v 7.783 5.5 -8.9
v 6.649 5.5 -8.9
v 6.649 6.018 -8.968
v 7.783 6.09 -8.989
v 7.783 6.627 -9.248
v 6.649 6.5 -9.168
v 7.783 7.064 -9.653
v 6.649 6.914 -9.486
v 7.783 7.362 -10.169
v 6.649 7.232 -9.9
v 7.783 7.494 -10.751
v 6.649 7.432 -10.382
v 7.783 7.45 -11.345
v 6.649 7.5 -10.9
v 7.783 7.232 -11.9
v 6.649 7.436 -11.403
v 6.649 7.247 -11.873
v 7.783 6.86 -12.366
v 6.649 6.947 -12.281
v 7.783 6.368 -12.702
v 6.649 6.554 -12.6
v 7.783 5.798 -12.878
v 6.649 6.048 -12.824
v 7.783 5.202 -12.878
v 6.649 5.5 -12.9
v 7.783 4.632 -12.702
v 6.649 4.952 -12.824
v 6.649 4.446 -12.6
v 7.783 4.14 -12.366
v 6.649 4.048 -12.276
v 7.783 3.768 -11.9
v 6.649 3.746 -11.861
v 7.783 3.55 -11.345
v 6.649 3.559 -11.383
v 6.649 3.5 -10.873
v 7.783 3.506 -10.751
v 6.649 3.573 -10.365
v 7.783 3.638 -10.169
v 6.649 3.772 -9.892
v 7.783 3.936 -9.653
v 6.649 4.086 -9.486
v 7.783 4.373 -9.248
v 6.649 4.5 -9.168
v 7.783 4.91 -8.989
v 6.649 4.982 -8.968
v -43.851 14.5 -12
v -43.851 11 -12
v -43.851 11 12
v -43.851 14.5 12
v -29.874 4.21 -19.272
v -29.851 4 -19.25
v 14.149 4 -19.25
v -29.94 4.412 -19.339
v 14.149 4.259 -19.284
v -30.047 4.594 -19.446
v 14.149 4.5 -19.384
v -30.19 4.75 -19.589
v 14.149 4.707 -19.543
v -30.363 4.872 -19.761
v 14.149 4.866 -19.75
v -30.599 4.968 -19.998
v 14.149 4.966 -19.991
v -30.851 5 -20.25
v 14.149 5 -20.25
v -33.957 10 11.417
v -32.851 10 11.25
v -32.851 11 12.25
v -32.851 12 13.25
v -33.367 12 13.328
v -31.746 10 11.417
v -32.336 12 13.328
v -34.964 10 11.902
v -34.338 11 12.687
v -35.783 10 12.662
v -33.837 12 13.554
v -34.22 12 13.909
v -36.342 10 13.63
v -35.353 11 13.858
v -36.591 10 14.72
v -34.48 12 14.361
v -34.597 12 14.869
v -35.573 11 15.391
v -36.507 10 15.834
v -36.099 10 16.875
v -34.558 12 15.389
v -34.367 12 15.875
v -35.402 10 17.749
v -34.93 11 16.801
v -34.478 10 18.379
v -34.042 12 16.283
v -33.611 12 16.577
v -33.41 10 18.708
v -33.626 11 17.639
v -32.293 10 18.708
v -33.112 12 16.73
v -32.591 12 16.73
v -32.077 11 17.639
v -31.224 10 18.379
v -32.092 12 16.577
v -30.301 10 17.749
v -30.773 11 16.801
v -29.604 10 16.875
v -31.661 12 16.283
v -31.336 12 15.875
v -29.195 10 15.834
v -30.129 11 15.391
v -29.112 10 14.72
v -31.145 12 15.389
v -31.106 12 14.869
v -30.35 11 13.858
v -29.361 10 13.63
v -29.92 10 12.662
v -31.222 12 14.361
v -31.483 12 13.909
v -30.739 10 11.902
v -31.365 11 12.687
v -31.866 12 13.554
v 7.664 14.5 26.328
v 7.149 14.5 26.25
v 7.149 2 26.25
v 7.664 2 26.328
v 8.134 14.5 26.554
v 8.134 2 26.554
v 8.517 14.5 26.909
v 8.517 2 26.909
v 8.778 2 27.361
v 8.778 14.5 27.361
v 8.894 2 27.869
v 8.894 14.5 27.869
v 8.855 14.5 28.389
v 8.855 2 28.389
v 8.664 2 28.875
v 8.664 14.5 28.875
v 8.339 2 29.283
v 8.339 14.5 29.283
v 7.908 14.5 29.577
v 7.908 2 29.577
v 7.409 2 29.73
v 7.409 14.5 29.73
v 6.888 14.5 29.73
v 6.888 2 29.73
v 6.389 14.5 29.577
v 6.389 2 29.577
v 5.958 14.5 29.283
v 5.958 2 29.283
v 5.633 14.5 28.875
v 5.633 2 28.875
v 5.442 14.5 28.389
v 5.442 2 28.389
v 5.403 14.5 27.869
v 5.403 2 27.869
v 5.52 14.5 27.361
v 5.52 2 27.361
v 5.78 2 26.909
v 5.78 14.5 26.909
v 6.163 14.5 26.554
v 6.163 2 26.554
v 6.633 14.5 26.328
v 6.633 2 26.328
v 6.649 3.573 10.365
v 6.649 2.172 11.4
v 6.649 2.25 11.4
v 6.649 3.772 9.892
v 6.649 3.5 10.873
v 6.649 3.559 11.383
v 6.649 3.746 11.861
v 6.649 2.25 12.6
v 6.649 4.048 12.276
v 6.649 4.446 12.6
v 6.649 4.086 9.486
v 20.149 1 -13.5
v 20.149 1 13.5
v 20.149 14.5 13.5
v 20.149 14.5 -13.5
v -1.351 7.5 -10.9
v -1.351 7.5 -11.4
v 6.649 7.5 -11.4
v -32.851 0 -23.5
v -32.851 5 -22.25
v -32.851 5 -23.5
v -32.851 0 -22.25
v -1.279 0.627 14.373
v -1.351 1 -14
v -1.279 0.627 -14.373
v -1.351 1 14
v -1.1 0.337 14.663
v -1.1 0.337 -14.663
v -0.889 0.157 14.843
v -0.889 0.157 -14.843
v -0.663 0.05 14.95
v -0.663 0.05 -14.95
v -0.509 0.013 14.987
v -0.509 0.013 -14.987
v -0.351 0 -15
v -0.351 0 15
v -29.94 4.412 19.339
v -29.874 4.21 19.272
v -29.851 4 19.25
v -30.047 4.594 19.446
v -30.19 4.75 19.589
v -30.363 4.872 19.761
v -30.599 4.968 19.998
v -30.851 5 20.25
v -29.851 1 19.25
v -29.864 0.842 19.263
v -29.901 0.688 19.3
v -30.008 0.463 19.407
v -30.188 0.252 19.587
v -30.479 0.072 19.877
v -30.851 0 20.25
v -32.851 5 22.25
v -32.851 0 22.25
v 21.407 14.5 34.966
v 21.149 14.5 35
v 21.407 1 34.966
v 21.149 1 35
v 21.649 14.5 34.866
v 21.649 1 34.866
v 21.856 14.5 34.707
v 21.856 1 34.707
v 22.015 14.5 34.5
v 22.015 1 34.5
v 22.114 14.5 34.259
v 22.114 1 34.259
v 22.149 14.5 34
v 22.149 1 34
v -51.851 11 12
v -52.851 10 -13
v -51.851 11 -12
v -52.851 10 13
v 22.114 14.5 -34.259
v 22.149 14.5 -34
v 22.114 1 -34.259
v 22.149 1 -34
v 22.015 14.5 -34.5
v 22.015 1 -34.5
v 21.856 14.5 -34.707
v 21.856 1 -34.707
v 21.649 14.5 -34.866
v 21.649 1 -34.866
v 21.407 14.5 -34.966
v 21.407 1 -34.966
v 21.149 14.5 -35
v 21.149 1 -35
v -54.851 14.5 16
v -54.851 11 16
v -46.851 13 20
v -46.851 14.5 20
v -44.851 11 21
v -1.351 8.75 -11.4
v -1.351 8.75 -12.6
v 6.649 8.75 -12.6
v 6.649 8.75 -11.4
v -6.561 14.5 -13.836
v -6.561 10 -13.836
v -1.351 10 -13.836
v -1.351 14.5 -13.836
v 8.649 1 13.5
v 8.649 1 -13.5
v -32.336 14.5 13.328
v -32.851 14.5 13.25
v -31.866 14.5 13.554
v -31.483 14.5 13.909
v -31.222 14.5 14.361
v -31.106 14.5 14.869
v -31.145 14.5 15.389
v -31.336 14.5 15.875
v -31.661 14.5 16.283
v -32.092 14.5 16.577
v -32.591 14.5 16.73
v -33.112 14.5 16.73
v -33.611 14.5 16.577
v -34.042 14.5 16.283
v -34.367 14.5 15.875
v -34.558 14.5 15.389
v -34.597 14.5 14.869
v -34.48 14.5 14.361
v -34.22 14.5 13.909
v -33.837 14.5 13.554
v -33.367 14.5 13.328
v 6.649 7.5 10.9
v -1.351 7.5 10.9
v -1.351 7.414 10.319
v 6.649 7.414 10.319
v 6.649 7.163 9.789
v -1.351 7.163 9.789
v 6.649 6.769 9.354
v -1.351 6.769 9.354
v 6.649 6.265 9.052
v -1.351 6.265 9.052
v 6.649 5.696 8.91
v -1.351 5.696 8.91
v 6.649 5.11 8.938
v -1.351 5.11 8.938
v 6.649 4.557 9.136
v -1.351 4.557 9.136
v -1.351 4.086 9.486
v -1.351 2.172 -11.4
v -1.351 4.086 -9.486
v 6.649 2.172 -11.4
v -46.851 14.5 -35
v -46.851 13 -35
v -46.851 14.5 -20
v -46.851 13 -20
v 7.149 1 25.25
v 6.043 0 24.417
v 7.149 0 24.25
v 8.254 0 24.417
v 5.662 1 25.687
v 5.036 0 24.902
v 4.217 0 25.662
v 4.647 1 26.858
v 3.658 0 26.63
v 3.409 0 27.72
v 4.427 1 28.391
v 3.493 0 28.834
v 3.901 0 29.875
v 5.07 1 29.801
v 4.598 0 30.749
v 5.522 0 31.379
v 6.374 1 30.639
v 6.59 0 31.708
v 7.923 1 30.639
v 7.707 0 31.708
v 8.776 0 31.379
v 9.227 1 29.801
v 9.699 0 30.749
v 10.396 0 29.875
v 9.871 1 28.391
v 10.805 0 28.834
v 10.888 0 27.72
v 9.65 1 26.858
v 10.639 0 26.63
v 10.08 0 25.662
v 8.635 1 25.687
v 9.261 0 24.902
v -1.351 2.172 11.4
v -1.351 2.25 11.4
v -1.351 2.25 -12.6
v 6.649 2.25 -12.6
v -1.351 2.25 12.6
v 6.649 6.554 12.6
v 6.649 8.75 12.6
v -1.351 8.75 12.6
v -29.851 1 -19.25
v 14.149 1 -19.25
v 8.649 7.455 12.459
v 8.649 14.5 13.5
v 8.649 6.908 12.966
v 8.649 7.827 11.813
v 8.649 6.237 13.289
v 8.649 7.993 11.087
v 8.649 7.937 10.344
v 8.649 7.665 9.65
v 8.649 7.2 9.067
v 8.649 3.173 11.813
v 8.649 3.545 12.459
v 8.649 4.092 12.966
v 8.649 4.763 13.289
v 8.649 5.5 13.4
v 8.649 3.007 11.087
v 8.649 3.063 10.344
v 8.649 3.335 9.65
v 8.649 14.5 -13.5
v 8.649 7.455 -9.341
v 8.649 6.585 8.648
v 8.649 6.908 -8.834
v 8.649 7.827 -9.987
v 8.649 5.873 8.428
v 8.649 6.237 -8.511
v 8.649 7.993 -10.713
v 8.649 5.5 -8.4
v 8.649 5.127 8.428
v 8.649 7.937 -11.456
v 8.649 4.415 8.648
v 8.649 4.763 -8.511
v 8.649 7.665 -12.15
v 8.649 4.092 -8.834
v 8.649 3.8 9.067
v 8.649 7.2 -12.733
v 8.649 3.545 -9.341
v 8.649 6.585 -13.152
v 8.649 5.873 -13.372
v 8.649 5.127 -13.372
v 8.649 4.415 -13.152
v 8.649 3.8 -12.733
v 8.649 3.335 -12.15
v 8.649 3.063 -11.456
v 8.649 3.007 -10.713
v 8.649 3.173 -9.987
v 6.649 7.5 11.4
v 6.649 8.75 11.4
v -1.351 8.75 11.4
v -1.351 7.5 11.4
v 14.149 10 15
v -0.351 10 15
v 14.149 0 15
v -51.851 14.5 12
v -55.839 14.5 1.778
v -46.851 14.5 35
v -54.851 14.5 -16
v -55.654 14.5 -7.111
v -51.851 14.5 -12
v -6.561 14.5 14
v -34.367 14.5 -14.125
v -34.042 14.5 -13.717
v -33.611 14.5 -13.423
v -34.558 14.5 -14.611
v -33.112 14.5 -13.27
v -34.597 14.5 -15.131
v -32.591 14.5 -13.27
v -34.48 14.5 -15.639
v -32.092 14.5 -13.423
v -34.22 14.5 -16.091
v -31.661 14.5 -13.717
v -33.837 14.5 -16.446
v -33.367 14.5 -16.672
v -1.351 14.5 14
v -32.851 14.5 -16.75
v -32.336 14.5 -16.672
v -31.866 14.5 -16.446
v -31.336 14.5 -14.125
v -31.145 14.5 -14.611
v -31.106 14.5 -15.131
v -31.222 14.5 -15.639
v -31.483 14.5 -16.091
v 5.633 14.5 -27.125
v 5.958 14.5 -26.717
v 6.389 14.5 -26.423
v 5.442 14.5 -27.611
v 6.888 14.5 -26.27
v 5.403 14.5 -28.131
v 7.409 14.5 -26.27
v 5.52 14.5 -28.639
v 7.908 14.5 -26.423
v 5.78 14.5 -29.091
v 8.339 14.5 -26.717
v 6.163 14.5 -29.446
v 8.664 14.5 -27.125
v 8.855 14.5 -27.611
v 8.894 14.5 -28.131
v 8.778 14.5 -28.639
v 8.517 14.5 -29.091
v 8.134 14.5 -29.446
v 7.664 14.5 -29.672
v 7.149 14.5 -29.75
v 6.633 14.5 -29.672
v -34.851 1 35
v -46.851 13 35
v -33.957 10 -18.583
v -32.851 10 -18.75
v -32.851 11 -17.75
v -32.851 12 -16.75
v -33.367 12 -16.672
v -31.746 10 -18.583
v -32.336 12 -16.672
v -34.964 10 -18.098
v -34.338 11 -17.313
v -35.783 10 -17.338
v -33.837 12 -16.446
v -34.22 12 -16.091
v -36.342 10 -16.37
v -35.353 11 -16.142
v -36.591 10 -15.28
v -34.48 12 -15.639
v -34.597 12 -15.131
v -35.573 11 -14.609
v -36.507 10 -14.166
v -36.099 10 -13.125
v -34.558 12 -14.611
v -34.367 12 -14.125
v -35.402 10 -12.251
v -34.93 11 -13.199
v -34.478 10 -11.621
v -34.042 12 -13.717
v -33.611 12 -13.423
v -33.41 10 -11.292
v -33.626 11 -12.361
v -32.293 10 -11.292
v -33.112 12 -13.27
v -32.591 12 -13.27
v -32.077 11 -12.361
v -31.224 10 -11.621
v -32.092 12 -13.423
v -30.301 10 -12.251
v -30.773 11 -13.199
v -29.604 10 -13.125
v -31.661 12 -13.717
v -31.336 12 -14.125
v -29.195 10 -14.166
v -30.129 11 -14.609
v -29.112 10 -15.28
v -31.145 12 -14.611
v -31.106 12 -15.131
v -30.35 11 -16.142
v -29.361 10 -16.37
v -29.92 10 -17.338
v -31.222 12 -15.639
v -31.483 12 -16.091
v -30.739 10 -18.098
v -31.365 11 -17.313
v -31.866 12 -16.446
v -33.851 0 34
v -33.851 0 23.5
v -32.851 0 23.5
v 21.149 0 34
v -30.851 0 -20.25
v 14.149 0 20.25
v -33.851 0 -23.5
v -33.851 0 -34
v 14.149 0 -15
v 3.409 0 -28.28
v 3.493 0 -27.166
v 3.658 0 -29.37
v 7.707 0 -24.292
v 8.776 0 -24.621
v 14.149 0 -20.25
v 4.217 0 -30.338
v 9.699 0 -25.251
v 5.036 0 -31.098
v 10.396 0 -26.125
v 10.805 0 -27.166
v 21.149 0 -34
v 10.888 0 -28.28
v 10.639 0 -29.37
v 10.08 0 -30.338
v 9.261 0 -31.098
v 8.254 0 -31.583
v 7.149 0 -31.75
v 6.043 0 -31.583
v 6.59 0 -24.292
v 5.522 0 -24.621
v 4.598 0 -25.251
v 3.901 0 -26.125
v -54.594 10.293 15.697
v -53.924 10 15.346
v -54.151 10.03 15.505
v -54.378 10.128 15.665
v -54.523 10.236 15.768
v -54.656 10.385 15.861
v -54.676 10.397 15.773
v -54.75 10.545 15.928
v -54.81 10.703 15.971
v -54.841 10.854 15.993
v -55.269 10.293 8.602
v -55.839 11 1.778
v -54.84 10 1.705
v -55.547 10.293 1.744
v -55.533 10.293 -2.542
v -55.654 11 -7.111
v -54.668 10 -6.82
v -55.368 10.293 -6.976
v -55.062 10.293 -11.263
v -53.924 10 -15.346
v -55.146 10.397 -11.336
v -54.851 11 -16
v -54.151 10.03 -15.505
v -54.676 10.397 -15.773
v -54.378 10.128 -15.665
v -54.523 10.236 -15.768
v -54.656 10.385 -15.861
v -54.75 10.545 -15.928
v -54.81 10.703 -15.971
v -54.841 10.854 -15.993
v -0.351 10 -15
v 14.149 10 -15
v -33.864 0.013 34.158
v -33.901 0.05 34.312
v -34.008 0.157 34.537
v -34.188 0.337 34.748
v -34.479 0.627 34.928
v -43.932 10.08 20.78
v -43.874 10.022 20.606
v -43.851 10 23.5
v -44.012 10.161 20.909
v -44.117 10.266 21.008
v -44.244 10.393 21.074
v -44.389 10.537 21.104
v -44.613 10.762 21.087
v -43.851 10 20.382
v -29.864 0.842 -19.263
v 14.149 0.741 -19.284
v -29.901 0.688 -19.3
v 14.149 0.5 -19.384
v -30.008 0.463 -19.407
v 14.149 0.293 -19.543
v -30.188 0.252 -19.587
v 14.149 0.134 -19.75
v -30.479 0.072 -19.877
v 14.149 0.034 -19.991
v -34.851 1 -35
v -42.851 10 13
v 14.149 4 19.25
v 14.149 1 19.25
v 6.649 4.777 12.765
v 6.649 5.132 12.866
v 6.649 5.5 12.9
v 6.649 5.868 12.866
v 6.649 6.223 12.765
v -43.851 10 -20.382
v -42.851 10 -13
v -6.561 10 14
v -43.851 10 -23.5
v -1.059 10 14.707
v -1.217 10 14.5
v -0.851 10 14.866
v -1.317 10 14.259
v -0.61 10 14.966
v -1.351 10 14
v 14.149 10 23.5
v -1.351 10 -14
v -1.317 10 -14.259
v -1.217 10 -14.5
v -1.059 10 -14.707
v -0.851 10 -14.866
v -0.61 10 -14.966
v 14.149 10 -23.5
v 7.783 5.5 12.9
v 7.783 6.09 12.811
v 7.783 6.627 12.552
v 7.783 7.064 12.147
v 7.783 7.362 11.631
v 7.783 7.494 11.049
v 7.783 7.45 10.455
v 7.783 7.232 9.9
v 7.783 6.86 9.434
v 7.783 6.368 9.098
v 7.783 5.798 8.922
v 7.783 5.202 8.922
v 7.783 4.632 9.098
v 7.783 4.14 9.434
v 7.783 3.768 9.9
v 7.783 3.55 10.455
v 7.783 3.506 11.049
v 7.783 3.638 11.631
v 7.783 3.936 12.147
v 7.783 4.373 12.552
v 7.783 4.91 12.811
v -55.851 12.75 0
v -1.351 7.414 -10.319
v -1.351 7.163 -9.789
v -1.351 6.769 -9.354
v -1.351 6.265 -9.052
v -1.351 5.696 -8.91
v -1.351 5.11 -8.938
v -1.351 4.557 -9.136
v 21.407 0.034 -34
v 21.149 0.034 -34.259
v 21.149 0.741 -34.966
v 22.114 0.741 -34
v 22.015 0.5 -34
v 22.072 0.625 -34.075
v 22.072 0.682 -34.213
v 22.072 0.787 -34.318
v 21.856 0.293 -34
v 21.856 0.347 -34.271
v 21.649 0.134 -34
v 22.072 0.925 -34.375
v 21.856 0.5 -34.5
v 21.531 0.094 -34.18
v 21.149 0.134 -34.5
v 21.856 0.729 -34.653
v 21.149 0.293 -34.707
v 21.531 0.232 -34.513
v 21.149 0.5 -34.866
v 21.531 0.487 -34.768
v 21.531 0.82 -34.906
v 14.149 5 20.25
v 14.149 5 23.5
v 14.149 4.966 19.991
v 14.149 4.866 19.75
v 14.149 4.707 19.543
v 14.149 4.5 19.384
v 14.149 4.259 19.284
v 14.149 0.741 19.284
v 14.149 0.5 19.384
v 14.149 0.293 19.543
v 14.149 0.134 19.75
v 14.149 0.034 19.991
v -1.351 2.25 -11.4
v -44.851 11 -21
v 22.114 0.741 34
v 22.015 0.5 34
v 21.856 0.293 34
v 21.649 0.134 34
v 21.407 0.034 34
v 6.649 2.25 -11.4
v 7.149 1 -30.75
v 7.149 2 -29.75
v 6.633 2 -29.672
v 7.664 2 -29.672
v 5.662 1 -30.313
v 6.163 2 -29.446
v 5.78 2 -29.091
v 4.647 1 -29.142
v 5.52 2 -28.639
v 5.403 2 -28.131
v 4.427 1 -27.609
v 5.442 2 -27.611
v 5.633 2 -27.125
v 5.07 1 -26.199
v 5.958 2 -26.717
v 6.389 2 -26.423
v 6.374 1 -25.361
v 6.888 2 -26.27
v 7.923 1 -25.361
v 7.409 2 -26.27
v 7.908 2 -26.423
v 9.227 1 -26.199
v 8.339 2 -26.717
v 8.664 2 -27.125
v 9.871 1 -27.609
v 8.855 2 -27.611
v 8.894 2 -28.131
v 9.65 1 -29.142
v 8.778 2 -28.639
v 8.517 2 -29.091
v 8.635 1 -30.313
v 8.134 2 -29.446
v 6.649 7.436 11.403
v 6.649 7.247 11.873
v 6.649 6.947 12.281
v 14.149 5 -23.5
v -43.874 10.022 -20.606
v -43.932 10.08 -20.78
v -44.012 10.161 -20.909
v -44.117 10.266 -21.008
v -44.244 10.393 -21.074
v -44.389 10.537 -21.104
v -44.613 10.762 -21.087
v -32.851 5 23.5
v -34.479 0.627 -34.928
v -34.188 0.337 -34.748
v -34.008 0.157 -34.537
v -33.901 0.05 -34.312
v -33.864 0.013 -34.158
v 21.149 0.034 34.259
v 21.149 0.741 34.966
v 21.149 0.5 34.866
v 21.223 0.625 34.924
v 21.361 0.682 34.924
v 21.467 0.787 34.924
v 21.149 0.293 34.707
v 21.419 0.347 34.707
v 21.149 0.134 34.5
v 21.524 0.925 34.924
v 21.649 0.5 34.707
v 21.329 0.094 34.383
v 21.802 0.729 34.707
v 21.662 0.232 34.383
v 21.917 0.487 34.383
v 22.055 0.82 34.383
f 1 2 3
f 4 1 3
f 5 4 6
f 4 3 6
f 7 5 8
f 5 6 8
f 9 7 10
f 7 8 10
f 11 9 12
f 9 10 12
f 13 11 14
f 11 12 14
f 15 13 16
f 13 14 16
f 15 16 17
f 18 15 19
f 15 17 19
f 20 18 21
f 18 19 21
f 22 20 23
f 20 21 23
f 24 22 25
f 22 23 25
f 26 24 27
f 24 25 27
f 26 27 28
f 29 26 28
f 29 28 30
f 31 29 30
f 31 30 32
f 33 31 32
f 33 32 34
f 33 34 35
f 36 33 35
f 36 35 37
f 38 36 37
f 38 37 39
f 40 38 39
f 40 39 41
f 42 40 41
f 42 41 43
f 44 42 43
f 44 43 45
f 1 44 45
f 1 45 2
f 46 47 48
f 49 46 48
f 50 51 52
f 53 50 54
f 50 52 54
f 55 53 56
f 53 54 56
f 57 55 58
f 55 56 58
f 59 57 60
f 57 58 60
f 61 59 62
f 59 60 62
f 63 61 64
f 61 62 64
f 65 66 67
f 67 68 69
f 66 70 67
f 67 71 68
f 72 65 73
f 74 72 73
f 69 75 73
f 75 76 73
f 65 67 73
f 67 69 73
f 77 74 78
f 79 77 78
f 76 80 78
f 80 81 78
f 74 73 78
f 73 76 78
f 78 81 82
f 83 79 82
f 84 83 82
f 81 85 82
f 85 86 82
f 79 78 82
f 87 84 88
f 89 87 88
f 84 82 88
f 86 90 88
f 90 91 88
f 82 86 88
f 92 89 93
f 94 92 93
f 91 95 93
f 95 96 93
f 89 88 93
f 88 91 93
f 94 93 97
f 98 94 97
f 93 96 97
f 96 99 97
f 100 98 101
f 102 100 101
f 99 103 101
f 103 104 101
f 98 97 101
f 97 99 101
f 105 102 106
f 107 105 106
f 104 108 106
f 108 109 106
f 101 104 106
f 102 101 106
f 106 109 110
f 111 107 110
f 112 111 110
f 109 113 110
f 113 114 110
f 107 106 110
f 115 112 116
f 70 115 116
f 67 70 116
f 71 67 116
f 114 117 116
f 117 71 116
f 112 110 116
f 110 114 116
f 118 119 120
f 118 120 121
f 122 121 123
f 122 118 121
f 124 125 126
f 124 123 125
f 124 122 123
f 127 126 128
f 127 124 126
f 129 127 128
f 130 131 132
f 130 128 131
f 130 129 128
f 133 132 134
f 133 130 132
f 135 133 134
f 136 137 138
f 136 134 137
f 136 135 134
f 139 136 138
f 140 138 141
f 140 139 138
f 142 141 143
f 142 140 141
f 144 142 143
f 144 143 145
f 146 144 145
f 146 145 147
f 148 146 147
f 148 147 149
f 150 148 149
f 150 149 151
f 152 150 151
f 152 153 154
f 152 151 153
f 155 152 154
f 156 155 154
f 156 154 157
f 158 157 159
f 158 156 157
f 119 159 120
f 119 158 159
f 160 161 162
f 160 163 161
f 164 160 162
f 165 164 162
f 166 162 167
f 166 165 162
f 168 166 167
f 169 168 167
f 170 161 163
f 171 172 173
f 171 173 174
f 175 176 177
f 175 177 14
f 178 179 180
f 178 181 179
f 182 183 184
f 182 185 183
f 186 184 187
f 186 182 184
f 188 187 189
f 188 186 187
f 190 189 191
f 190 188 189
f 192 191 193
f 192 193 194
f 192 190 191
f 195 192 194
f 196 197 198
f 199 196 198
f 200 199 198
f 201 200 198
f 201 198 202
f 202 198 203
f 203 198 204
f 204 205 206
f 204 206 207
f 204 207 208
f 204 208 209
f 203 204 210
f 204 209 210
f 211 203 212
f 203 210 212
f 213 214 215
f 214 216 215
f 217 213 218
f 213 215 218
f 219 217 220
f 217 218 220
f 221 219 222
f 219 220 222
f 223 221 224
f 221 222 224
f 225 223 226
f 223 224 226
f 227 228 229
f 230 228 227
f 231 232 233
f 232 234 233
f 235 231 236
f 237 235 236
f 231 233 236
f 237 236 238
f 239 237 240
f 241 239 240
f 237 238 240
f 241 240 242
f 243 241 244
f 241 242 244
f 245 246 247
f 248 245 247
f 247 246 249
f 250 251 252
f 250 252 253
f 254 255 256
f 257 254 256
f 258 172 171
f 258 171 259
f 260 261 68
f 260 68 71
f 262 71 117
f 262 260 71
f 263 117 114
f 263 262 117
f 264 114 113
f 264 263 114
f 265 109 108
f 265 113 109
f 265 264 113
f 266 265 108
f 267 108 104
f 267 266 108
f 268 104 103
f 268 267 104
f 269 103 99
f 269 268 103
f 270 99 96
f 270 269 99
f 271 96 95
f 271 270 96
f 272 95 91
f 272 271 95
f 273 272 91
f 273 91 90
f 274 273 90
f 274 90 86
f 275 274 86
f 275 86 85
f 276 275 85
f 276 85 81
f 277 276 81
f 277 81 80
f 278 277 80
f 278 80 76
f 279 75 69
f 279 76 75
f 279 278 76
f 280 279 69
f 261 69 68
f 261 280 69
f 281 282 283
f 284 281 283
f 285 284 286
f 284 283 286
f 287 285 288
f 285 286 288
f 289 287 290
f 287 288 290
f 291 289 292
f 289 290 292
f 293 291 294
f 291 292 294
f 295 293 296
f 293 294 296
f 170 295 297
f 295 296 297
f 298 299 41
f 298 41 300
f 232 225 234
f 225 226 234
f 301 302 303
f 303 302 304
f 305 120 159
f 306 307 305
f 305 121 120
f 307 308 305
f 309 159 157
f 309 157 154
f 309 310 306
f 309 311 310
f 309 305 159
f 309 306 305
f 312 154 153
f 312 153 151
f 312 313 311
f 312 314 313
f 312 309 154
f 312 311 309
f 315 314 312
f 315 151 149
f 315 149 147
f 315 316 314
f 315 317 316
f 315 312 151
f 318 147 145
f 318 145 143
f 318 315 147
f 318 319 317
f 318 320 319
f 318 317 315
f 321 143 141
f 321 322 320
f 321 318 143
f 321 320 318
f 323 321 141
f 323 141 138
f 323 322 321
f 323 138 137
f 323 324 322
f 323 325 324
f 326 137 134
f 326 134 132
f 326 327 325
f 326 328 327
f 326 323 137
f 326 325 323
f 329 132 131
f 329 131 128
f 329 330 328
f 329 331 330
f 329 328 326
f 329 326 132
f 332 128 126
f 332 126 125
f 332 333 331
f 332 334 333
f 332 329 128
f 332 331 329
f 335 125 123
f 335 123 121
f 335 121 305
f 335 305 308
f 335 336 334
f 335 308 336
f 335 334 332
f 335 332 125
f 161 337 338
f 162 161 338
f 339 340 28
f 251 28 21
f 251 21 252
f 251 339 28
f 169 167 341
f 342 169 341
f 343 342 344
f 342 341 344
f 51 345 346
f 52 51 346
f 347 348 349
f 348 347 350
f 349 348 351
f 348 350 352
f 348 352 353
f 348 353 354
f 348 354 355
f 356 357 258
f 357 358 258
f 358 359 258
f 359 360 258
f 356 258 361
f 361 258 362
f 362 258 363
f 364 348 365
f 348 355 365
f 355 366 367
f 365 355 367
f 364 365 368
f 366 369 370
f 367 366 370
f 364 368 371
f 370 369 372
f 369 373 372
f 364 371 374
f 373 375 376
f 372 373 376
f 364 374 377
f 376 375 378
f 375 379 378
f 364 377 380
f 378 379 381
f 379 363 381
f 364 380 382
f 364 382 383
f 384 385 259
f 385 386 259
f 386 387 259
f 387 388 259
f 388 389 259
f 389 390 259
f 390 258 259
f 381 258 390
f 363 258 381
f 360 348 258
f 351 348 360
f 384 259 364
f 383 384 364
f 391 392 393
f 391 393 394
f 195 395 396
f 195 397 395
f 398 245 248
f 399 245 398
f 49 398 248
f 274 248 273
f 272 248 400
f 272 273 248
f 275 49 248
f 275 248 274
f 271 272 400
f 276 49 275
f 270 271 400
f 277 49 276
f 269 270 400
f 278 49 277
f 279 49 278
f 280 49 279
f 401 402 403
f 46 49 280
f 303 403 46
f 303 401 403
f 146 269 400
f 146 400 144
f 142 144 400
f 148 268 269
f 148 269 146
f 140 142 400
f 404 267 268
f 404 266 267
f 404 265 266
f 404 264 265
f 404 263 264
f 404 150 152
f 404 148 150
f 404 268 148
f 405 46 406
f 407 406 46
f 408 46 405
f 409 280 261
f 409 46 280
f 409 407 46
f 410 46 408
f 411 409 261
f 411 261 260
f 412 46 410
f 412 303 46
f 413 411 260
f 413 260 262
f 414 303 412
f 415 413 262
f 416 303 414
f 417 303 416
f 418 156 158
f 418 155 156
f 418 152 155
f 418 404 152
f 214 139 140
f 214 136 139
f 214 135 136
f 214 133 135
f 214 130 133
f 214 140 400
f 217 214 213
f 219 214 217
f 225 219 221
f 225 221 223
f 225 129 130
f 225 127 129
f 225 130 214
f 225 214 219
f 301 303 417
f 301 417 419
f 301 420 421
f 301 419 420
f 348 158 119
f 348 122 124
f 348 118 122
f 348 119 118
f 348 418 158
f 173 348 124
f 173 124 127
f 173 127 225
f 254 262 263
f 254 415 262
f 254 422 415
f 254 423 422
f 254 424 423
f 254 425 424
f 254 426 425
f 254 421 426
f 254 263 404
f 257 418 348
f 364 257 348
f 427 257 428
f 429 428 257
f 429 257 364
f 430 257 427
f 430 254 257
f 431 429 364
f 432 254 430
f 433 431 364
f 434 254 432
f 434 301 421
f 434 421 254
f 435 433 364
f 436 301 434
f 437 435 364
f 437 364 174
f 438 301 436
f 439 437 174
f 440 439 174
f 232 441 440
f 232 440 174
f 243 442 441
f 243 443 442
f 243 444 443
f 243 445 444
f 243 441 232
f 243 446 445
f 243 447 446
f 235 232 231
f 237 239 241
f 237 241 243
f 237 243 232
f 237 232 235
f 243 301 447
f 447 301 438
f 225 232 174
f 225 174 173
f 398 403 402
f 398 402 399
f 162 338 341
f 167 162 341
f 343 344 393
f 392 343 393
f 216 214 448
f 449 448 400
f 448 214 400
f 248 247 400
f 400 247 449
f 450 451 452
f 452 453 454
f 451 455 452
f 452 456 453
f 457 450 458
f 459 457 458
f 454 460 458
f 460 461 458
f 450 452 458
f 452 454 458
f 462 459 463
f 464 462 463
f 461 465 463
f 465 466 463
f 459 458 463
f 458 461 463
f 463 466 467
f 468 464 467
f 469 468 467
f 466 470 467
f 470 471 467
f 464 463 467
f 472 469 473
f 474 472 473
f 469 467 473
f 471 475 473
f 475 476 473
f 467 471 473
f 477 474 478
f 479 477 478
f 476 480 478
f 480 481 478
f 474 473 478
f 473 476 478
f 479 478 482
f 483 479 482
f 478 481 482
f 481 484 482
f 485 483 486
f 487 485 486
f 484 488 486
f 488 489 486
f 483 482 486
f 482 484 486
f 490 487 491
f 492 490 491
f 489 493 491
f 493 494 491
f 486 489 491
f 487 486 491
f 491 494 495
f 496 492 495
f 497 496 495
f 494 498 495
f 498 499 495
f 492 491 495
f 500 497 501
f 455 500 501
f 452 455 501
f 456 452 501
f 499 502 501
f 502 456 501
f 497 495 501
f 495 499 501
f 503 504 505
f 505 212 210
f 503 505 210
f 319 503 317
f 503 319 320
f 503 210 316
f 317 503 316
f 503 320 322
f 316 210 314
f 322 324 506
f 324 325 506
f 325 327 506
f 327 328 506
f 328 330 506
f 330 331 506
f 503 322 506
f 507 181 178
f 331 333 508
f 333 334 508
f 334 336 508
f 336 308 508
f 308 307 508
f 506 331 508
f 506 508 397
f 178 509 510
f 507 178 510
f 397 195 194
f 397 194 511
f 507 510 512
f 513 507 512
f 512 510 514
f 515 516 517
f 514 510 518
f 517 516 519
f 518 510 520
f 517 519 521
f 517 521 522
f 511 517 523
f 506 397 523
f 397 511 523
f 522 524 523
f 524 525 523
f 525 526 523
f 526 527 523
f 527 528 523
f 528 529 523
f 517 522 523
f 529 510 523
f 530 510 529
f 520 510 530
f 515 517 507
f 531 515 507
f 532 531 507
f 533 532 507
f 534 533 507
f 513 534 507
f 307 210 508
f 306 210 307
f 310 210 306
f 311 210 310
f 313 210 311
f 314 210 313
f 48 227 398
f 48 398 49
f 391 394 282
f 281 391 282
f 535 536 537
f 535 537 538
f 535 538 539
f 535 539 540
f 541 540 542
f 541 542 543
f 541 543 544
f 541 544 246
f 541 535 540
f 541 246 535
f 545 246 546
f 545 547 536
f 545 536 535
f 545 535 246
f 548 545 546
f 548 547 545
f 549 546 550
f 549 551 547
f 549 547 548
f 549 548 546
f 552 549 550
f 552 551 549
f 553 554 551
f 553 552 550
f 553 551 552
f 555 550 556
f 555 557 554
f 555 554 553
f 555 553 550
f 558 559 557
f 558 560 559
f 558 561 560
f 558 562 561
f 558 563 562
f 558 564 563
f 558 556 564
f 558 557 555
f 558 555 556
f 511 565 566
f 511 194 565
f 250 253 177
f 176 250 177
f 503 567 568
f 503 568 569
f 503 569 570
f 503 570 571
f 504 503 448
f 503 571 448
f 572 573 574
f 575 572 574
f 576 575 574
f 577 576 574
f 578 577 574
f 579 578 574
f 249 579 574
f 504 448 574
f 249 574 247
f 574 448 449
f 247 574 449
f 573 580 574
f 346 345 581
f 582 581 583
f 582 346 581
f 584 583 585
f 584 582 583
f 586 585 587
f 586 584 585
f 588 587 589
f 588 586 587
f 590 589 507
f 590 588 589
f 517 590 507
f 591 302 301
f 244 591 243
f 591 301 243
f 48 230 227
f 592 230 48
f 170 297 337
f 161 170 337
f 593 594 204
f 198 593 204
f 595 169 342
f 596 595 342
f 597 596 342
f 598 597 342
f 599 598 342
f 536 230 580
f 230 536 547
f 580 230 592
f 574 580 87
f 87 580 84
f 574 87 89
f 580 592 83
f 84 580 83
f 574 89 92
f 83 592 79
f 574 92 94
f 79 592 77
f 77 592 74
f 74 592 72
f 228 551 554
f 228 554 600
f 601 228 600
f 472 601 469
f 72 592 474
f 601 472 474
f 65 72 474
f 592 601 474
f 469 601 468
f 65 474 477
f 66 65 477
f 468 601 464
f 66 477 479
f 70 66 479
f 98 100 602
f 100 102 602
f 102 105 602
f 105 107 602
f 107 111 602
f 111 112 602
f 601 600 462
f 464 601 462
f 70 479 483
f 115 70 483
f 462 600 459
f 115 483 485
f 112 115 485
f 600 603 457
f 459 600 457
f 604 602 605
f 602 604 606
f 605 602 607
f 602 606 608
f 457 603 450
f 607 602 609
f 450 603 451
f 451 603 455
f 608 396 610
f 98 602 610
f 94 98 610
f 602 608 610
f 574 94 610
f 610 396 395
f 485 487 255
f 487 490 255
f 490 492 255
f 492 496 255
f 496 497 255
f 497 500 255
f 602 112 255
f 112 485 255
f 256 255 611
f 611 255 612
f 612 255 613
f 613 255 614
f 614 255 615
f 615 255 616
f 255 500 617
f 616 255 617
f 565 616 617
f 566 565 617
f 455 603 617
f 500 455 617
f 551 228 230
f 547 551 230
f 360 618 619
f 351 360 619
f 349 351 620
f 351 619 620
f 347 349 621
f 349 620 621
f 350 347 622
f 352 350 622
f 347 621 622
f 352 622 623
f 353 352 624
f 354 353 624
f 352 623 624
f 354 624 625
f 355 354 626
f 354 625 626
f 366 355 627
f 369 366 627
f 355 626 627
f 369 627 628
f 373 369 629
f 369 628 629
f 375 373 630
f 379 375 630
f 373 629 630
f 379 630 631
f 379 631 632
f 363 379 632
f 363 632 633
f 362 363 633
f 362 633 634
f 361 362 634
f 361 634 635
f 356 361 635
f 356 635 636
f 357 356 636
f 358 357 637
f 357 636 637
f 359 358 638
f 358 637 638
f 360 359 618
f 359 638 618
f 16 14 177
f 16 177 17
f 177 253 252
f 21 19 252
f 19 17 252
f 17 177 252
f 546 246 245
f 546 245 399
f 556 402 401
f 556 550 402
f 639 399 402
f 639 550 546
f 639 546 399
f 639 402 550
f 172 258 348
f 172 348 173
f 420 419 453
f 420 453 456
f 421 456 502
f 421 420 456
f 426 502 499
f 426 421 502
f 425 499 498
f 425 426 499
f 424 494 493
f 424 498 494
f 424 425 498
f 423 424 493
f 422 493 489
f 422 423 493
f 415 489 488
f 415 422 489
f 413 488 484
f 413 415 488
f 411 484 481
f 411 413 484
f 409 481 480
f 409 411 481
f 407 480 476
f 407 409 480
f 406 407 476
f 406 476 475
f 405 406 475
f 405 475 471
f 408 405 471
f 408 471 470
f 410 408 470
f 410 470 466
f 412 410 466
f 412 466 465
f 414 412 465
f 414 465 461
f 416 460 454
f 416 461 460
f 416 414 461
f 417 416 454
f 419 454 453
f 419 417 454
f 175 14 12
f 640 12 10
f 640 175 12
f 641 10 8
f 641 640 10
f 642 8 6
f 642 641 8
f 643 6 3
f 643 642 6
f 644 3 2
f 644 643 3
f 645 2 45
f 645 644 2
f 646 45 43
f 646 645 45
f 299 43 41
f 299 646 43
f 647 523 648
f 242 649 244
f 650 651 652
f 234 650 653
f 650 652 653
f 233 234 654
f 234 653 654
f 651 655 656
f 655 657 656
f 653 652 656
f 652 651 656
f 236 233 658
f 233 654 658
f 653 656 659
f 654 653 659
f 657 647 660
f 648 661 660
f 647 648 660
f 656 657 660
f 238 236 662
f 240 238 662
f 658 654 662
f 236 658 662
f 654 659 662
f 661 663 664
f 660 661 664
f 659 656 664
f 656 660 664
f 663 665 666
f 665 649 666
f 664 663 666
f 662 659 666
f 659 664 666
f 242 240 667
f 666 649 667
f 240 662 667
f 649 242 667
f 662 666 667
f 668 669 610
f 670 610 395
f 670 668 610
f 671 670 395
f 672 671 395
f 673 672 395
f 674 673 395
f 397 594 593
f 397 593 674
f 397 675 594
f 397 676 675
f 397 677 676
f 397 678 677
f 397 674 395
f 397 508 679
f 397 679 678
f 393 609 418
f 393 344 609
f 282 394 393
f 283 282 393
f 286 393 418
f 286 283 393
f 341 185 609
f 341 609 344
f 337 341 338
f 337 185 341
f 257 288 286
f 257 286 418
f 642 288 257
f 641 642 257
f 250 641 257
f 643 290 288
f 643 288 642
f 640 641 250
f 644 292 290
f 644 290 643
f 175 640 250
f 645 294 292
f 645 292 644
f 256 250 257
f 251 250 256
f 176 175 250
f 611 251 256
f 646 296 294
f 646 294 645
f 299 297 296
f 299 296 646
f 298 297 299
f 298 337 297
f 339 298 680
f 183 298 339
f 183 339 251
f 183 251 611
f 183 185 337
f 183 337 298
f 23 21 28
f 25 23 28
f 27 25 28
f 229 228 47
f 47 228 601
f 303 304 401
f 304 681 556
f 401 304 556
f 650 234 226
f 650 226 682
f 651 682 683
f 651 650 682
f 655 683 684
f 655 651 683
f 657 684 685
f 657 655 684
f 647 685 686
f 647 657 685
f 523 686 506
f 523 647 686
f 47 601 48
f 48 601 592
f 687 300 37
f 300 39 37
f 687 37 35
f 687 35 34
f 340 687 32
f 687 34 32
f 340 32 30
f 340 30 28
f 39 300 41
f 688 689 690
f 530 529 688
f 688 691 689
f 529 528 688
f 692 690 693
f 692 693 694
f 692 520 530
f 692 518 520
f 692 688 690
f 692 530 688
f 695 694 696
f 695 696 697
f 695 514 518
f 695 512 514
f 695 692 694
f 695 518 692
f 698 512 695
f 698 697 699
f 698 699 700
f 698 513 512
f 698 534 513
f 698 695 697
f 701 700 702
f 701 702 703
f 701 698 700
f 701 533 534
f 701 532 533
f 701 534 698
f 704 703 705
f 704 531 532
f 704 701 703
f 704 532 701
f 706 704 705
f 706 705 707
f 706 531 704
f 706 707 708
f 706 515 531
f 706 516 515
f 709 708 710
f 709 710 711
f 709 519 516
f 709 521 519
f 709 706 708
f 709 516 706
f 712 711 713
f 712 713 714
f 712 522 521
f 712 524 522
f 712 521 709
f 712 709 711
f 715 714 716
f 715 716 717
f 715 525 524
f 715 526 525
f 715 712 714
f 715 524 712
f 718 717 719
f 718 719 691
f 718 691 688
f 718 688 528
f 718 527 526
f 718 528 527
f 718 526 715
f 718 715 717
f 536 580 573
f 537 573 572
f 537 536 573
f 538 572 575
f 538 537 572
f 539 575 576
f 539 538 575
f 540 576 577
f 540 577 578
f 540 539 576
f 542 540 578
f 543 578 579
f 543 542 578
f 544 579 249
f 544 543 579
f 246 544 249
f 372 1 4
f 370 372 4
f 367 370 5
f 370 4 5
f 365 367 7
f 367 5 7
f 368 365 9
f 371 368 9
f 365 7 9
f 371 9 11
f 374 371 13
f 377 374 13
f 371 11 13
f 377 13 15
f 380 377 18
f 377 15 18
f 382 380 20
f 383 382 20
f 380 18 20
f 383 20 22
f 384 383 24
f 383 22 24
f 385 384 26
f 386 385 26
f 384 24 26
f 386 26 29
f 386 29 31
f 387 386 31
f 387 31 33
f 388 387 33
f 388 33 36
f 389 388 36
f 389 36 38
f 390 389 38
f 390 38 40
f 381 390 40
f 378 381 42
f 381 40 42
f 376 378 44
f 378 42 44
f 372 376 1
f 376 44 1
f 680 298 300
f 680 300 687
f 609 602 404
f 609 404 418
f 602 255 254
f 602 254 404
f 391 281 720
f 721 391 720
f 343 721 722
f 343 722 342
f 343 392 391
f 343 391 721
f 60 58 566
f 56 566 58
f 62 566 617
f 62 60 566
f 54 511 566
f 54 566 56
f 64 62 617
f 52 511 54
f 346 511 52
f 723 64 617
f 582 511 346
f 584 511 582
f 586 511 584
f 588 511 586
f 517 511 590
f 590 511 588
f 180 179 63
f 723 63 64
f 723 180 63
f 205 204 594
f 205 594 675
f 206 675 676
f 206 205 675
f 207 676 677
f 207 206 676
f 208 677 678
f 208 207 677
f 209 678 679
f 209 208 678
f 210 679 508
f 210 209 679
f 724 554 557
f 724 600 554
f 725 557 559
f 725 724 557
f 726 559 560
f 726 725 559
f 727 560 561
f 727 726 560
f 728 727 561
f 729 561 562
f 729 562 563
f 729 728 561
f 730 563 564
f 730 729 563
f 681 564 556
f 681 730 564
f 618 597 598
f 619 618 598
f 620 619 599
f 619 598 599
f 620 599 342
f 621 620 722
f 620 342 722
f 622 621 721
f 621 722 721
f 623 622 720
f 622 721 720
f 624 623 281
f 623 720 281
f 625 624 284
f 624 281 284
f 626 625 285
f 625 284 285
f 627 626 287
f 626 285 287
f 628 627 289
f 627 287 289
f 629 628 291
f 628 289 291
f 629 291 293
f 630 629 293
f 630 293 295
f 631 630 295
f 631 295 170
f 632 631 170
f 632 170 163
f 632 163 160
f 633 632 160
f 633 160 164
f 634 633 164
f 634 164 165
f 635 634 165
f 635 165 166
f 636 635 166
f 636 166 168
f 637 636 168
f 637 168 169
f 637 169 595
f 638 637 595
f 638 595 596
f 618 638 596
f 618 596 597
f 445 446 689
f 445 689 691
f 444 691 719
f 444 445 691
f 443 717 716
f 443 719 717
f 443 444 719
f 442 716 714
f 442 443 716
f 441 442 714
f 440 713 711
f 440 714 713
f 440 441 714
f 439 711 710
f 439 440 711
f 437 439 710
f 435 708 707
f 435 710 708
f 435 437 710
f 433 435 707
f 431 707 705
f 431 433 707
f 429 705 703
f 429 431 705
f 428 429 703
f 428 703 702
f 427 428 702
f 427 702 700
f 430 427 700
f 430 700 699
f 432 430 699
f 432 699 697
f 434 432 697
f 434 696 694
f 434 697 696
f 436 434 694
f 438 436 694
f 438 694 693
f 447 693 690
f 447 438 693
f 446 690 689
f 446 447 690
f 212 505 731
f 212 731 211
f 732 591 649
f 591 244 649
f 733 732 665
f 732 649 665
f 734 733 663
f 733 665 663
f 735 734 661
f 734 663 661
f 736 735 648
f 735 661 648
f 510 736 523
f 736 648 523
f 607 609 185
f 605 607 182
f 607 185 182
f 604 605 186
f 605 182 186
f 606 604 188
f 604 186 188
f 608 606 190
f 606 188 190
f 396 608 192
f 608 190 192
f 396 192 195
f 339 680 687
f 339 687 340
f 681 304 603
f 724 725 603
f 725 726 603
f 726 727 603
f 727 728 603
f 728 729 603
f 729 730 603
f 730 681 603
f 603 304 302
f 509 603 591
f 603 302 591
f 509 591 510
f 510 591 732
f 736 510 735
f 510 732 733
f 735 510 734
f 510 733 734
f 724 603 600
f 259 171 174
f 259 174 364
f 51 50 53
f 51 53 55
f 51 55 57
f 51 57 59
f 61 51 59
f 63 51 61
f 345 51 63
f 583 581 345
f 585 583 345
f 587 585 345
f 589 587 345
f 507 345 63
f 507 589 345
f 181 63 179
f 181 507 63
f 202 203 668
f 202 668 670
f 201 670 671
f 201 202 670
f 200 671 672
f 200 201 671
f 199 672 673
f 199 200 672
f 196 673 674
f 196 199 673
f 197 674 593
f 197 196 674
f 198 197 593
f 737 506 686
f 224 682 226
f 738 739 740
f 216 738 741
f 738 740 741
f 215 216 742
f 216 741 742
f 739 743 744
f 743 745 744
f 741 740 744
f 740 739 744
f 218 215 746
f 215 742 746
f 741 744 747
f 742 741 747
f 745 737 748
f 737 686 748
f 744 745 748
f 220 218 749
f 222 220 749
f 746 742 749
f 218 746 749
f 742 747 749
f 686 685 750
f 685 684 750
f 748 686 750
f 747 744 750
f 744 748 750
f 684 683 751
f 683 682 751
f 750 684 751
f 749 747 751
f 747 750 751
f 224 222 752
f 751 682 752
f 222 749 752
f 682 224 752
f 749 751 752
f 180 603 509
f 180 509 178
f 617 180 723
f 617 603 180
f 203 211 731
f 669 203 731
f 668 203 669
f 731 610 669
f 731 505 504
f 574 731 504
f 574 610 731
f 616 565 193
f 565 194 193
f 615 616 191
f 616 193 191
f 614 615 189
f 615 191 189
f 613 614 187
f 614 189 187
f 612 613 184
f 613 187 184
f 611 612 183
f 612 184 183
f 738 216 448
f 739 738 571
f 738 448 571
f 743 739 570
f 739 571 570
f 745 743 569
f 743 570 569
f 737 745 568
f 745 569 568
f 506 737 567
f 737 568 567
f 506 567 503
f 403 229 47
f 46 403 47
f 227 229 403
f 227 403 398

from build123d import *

# Parameters (mm, degrees)
BOSS_EXTRUDE2_DEPTH     = 5
BOSS_EXTRUDE3_DEPTH     = 5
BOSS_EXTRUDE4_DEPTH     = 4.5
CHAMFER1_SIZE           = 3
BOSS_EXTRUDE5_DEPTH     = 11.5
BOSS_EXTRUDE6_DEPTH     = 11.5
FILLET2_R               = 1
SKETCH11_W              = 8
SKETCH11_H              = 24
CUT_EXTRUDE6_DEPTH      = 67.666204955
CUT_EXTRUDE7_START      = -1
CUT_EXTRUDE7_DEPTH      = 67.488020314
CUT_EXTRUDE8_DEPTH      = 8
FILLET3_R               = 1
CHAMFER9_SIZE           = 1
CUT_EXTRUDE9_DEPTH      = 67.666205085
CUT_EXTRUDE9_DEPTH_BACK = 67.666205085
SKETCH14_R              = 1.75
CHAMFER10_SIZE          = 2
CHAMFER8_SIZE           = 3
SKETCH16_W              = 5.209820602
SKETCH16_H              = 27.835500312
CUT_EXTRUDE10_DEPTH     = 67.666205085
CUT_EXTRUDE11_REACH     = 75.086
SKETCH17_R              = 2
CHAMFER12_SIZE          = 0.5
CHAMFER12_SIZE2         = 0.866025404


with BuildPart() as part:
    # Sketch1 → Boss-Extrude2 (new body)
    with BuildSketch(Plane(origin=(0, 0, 0), x_dir=(1, 0, 0), z_dir=(0, 1, 0))):
        Polygon((-32.851435656, 19.25), (14.148564344, 19.25), (14.148564344, 15), (-1.351435656, 15), (-1.351435656, -15), (14.148564344, -15), (14.148564344, -19.25), (-32.851435656, -19.25), (-32.851435656, -35), (22.148564344, -35), (22.148564344, 35), (-32.851435656, 35), align=None)
    extrude(amount=BOSS_EXTRUDE2_DEPTH)

    # Sketch5 → Boss-Extrude3 (add)
    with BuildSketch(Plane(origin=(0, 5, 0), x_dir=(1, 0, 0), z_dir=(0, 1, 0))):
        Polygon((-32.851435656, 35), (22.148564344, 35), (22.148564344, -35), (-32.851435656, -35), (-32.851435656, -23.5), (14.148564344, -23.5), (14.148564344, -15), (-1.351435656, -15), (-1.351435656, 15), (14.148564344, 15), (14.148564344, 23.5), (-32.851435656, 23.5), align=None)
    extrude(amount=BOSS_EXTRUDE3_DEPTH)

    # Sketch6 → Boss-Extrude4 (add)
    with BuildSketch(Plane(origin=(0, 10, 0), x_dir=(1, 0, 0), z_dir=(0, 1, 0))):
        with BuildLine():
            Line((22.148564344, 35), (-46.851435656, 35))
            Line((-46.851435656, 35), (-46.851435656, 20))
            Line((-46.851435656, 20), (-54.851435656, 16))
            add(Edge.make_bspline(
                [(-54.851435656, -16), (-56.851435656, 0), (-54.851435656, 16)],
                knots=[0, 0, 0, 1, 1, 1], degree=2))
            Line((-54.851435656, -16), (-46.851435656, -20))
            Line((-46.851435656, -20), (-46.851435656, -35))
            Line((-46.851435656, -35), (22.148564344, -35))
            Line((22.148564344, -35), (22.148564344, -23))
            Line((22.148564344, -23), (22.148564344, 23))
            Line((22.148564344, 23), (22.148564344, 35))
        make_face()
    extrude(amount=BOSS_EXTRUDE4_DEPTH)

    # Chamfer1
    chamfer1_edges = [part.edges().sort_by_distance(p)[0] for p in [
        (-46.851435656, 10, -27.5),
        (-46.851435656, 10, 27.5),
    ]]
    chamfer(chamfer1_edges, length=CHAMFER1_SIZE)

    # Sketch7 → Boss-Extrude5 (add)
    with BuildSketch(Plane.XY.offset(35)):
        Polygon((-33.851435656, 0), (-43.851435656, 10), (-32.851435656, 10), (-32.851435656, 0), align=None)
    extrude(amount=-BOSS_EXTRUDE5_DEPTH)

    # Sketch8 → Boss-Extrude6 (add)
    with BuildSketch(Plane(origin=(0, 0, -35), x_dir=(-1, 0, 0), z_dir=(0, 0, -1))):
        Polygon((43.851435656, 10), (33.851435656, 0), (32.851435656, 0), (32.851435656, 10), align=None)
    extrude(amount=-BOSS_EXTRUDE6_DEPTH)

    # Fillet2
    fillet2_edges = [part.edges().sort_by_distance(p)[0] for p in [
        (-5.851435656, 0, -35),
        (22.148564344, 0, 0),
        (-5.851435656, 0, 35),
        (-9.351435656, 0, 19.25),
        (-1.351435656, 0, 0),
        (-9.351435656, 0, -19.25),
        (22.148564344, 7.25, -35),
        (22.148564344, 7.25, 35),
        (-1.351435656, 5, 15),
        (-1.351435656, 5, -15),
        (-9.351435656, 5, 19.25),
        (-9.351435656, 5, -19.25),
    ]]
    fillet(fillet2_edges, radius=FILLET2_R)

    # Sketch11 → Cut-Extrude6 (cut, through all)
    with BuildSketch(Plane.XZ.offset(-10)):
        with Locations((-47.851435656, 0)):
            Rectangle(SKETCH11_W, SKETCH11_H)
    extrude(amount=-CUT_EXTRUDE6_DEPTH, mode=Mode.SUBTRACT)

    # Sketch12 → Cut-Extrude7 (cut, through all)
    with BuildSketch(Plane.XZ.offset(CUT_EXTRUDE7_START)):
        Polygon((8.648564344, 13.5), (20.148564344, 13.5), (20.148564344, -13.5), (8.648564344, -13.5), (8.648564344, -7), (8.648564344, 7), align=None)
    extrude(amount=-CUT_EXTRUDE7_DEPTH, mode=Mode.SUBTRACT)

    # Sketch13 → Cut-Extrude8 (cut)
    with BuildSketch(Plane.ZY.offset(1.351435656)):
        with BuildLine():
            Line((11.4, 2.171572875), (11.4, 2.25))
            Line((11.4, 2.25), (12.6, 2.25))
            Line((12.6, 2.25), (12.6, 8.75))
            Line((12.6, 8.75), (11.4, 8.75))
            Line((11.4, 8.75), (11.4, 7.5))
            Line((11.4, 7.5), (10.9, 7.5))
            ThreePointArc((10.9, 7.5), (9.052240935, 6.265366865), (9.485786438, 4.085786438))
            Line((9.485786438, 4.085786438), (11.4, 2.171572875))
        make_face()
        with BuildLine():
            Line((-12.6, 8.75), (-11.4, 8.75))
            Line((-11.4, 8.75), (-11.4, 7.5))
            Line((-11.4, 7.5), (-10.9, 7.5))
            ThreePointArc((-10.9, 7.5), (-9.052240935, 6.265366865), (-9.485786438, 4.085786438))
            Line((-9.485786438, 4.085786438), (-11.4, 2.171572875))
            Line((-11.4, 2.171572875), (-11.4, 2.25))
            Line((-11.4, 2.25), (-12.6, 2.25))
            Line((-12.6, 2.25), (-12.6, 8.75))
        make_face()
    extrude(amount=-CUT_EXTRUDE8_DEPTH, mode=Mode.SUBTRACT)

    # Fillet3
    fillet3_edges = [part.edges().sort_by_distance(p)[0] for p in [
        (-49.351435656, 10, -18.75),
        (-55.851435656, 10, 0),
        (-49.351435656, 10, 18.75),
    ]]
    fillet(fillet3_edges, radius=FILLET3_R)

    # Chamfer9
    chamfer9_edges = [part.edges().sort_by_distance(p)[0] for p in [
        (-51.851435656, 10, 0),
        (-47.851435656, 10, -12),
        (-43.851435656, 10, 0),
        (-47.851435656, 10, 12),
    ]]
    chamfer(chamfer9_edges, length=CHAMFER9_SIZE)

    # Sketch14 → Cut-Extrude9 (cut, two sides: drawn at the far end of the back side and taken through both)
    with BuildSketch(Plane.XZ.offset(-10).offset(-CUT_EXTRUDE9_DEPTH_BACK)):
        with Locations(Location((-32.851435656, 15, 0), (0, 0, 270))):
            Circle(SKETCH14_R)
        with Locations(Location((-32.851435656, -15, 0), (0, 0, 270))):
            Circle(SKETCH14_R)
        with Locations((27.148564344, -15)):
            Circle(SKETCH14_R)
        with Locations((27.148564344, 15)):
            Circle(SKETCH14_R)
        with Locations(Location((7.148564344, 28, 0), (0, 0, 270))):
            Circle(SKETCH14_R)
        with Locations(Location((7.148564344, -28, 0), (0, 0, 270))):
            Circle(SKETCH14_R)
    extrude(amount=CUT_EXTRUDE9_DEPTH + CUT_EXTRUDE9_DEPTH_BACK, mode=Mode.SUBTRACT)

    # Chamfer10
    chamfer10_edges = [part.edges().sort_by_distance(p)[0] for p in [
        (7.148564344, 0, -26.25),
        (-32.851435656, 10, -13.25),
        (7.148564344, 0, 29.75),
        (-32.851435656, 10, 16.75),
    ]]
    chamfer(chamfer10_edges, length=CHAMFER10_SIZE)

    # Chamfer8
    # the kernel refuses this chamfer: 3 mm, written as the material it takes off along each edge
    with BuildSketch(Plane(origin=(-32.851435656, -6.715048964, -19.25), x_dir=(0.9996219169112965, 0, 0.02749587661058676), z_dir=(0, 1, 0))) as chamfer8_piece_1_section:
        Polygon((CHAMFER8_SIZE * 0.999621916911, CHAMFER8_SIZE * 0.0274958766106), (-CHAMFER8_SIZE * 0.0274958766106, CHAMFER8_SIZE * 0.999621916911), (0, 0), align=None)
    chamfer8_piece_1 = extrude(amount=18.430097928, mode=Mode.PRIVATE)
    chamfer8_piece_1 = split(chamfer8_piece_1, bisect_by=Plane(origin=(-31.873507714, 5, -20.294144115), z_dir=(0, -1, 0)), keep=Keep.TOP, mode=Mode.PRIVATE)
    add(chamfer8_piece_1, mode=Mode.SUBTRACT)
    with BuildSketch(Plane(origin=(-32.851435656, -6.715048964, 19.25), x_dir=(0.9996219169112968, 0, -0.027495876610586733), z_dir=(0, 1, 0))) as chamfer8_piece_2_section:
        Polygon((CHAMFER8_SIZE * 0.999621916911, -CHAMFER8_SIZE * 0.0274958766106), (-CHAMFER8_SIZE * 0.0274958766106, -CHAMFER8_SIZE * 0.999621916911), (0, 0), align=None)
    chamfer8_piece_2 = extrude(amount=18.430097928, mode=Mode.PRIVATE)
    chamfer8_piece_2 = split(chamfer8_piece_2, bisect_by=Plane(origin=(-31.873507712, 5, 20.294144115), z_dir=(0, -1, 0)), keep=Keep.TOP, mode=Mode.PRIVATE)
    add(chamfer8_piece_2, mode=Mode.SUBTRACT)

    # Sketch16 → Cut-Extrude10 (cut, through all)
    with BuildSketch(Plane.XZ.offset(-10)):
        with Locations((-3.956345957, 0.082249844)):
            Rectangle(SKETCH16_W, SKETCH16_H)
    extrude(amount=-CUT_EXTRUDE10_DEPTH, mode=Mode.SUBTRACT)

    # Sketch17 → Cut-Extrude11 (cut, up to next)
    with BuildSketch(Plane.ZY.offset(-6.648564344), mode=Mode.PRIVATE) as cut_extrude11_sk1:
        with Locations((-10.9, 5.5)):
            Circle(SKETCH17_R)
    cut_extrude11_tool1 = extrude(cut_extrude11_sk1.sketch, amount=-CUT_EXTRUDE11_REACH, mode=Mode.PRIVATE) & part.part
    # Sketch17 → Cut-Extrude11 (cut, up to next)
    with BuildSketch(Plane.ZY.offset(-6.648564344), mode=Mode.PRIVATE) as cut_extrude11_sk2:
        with Locations((10.9, 5.5)):
            Circle(SKETCH17_R)
    cut_extrude11_tool2 = extrude(cut_extrude11_sk2.sketch, amount=-CUT_EXTRUDE11_REACH, mode=Mode.PRIVATE) & part.part
    add(cut_extrude11_tool1.solids().sort_by_distance((6.648564, 5.5, -10.9))[0], mode=Mode.SUBTRACT)
    add(cut_extrude11_tool2.solids().sort_by_distance((6.648564, 5.5, 10.9))[0], mode=Mode.SUBTRACT)

    # Chamfer12
    chamfer12_edges = [part.edges().sort_by_distance(p)[0] for p in [
        (8.648564344, 5.5, -12.9),
        (8.648564344, 5.5, 8.9),
    ]]
    chamfer12_side = [part.faces().sort_by_distance(p)[0] for p in [
        (8.648564344, 7.91662971, 0),
    ]]
    chamfer(chamfer12_edges, length=CHAMFER12_SIZE, length2=CHAMFER12_SIZE2, reference=chamfer12_side[0])


solid = part.part
